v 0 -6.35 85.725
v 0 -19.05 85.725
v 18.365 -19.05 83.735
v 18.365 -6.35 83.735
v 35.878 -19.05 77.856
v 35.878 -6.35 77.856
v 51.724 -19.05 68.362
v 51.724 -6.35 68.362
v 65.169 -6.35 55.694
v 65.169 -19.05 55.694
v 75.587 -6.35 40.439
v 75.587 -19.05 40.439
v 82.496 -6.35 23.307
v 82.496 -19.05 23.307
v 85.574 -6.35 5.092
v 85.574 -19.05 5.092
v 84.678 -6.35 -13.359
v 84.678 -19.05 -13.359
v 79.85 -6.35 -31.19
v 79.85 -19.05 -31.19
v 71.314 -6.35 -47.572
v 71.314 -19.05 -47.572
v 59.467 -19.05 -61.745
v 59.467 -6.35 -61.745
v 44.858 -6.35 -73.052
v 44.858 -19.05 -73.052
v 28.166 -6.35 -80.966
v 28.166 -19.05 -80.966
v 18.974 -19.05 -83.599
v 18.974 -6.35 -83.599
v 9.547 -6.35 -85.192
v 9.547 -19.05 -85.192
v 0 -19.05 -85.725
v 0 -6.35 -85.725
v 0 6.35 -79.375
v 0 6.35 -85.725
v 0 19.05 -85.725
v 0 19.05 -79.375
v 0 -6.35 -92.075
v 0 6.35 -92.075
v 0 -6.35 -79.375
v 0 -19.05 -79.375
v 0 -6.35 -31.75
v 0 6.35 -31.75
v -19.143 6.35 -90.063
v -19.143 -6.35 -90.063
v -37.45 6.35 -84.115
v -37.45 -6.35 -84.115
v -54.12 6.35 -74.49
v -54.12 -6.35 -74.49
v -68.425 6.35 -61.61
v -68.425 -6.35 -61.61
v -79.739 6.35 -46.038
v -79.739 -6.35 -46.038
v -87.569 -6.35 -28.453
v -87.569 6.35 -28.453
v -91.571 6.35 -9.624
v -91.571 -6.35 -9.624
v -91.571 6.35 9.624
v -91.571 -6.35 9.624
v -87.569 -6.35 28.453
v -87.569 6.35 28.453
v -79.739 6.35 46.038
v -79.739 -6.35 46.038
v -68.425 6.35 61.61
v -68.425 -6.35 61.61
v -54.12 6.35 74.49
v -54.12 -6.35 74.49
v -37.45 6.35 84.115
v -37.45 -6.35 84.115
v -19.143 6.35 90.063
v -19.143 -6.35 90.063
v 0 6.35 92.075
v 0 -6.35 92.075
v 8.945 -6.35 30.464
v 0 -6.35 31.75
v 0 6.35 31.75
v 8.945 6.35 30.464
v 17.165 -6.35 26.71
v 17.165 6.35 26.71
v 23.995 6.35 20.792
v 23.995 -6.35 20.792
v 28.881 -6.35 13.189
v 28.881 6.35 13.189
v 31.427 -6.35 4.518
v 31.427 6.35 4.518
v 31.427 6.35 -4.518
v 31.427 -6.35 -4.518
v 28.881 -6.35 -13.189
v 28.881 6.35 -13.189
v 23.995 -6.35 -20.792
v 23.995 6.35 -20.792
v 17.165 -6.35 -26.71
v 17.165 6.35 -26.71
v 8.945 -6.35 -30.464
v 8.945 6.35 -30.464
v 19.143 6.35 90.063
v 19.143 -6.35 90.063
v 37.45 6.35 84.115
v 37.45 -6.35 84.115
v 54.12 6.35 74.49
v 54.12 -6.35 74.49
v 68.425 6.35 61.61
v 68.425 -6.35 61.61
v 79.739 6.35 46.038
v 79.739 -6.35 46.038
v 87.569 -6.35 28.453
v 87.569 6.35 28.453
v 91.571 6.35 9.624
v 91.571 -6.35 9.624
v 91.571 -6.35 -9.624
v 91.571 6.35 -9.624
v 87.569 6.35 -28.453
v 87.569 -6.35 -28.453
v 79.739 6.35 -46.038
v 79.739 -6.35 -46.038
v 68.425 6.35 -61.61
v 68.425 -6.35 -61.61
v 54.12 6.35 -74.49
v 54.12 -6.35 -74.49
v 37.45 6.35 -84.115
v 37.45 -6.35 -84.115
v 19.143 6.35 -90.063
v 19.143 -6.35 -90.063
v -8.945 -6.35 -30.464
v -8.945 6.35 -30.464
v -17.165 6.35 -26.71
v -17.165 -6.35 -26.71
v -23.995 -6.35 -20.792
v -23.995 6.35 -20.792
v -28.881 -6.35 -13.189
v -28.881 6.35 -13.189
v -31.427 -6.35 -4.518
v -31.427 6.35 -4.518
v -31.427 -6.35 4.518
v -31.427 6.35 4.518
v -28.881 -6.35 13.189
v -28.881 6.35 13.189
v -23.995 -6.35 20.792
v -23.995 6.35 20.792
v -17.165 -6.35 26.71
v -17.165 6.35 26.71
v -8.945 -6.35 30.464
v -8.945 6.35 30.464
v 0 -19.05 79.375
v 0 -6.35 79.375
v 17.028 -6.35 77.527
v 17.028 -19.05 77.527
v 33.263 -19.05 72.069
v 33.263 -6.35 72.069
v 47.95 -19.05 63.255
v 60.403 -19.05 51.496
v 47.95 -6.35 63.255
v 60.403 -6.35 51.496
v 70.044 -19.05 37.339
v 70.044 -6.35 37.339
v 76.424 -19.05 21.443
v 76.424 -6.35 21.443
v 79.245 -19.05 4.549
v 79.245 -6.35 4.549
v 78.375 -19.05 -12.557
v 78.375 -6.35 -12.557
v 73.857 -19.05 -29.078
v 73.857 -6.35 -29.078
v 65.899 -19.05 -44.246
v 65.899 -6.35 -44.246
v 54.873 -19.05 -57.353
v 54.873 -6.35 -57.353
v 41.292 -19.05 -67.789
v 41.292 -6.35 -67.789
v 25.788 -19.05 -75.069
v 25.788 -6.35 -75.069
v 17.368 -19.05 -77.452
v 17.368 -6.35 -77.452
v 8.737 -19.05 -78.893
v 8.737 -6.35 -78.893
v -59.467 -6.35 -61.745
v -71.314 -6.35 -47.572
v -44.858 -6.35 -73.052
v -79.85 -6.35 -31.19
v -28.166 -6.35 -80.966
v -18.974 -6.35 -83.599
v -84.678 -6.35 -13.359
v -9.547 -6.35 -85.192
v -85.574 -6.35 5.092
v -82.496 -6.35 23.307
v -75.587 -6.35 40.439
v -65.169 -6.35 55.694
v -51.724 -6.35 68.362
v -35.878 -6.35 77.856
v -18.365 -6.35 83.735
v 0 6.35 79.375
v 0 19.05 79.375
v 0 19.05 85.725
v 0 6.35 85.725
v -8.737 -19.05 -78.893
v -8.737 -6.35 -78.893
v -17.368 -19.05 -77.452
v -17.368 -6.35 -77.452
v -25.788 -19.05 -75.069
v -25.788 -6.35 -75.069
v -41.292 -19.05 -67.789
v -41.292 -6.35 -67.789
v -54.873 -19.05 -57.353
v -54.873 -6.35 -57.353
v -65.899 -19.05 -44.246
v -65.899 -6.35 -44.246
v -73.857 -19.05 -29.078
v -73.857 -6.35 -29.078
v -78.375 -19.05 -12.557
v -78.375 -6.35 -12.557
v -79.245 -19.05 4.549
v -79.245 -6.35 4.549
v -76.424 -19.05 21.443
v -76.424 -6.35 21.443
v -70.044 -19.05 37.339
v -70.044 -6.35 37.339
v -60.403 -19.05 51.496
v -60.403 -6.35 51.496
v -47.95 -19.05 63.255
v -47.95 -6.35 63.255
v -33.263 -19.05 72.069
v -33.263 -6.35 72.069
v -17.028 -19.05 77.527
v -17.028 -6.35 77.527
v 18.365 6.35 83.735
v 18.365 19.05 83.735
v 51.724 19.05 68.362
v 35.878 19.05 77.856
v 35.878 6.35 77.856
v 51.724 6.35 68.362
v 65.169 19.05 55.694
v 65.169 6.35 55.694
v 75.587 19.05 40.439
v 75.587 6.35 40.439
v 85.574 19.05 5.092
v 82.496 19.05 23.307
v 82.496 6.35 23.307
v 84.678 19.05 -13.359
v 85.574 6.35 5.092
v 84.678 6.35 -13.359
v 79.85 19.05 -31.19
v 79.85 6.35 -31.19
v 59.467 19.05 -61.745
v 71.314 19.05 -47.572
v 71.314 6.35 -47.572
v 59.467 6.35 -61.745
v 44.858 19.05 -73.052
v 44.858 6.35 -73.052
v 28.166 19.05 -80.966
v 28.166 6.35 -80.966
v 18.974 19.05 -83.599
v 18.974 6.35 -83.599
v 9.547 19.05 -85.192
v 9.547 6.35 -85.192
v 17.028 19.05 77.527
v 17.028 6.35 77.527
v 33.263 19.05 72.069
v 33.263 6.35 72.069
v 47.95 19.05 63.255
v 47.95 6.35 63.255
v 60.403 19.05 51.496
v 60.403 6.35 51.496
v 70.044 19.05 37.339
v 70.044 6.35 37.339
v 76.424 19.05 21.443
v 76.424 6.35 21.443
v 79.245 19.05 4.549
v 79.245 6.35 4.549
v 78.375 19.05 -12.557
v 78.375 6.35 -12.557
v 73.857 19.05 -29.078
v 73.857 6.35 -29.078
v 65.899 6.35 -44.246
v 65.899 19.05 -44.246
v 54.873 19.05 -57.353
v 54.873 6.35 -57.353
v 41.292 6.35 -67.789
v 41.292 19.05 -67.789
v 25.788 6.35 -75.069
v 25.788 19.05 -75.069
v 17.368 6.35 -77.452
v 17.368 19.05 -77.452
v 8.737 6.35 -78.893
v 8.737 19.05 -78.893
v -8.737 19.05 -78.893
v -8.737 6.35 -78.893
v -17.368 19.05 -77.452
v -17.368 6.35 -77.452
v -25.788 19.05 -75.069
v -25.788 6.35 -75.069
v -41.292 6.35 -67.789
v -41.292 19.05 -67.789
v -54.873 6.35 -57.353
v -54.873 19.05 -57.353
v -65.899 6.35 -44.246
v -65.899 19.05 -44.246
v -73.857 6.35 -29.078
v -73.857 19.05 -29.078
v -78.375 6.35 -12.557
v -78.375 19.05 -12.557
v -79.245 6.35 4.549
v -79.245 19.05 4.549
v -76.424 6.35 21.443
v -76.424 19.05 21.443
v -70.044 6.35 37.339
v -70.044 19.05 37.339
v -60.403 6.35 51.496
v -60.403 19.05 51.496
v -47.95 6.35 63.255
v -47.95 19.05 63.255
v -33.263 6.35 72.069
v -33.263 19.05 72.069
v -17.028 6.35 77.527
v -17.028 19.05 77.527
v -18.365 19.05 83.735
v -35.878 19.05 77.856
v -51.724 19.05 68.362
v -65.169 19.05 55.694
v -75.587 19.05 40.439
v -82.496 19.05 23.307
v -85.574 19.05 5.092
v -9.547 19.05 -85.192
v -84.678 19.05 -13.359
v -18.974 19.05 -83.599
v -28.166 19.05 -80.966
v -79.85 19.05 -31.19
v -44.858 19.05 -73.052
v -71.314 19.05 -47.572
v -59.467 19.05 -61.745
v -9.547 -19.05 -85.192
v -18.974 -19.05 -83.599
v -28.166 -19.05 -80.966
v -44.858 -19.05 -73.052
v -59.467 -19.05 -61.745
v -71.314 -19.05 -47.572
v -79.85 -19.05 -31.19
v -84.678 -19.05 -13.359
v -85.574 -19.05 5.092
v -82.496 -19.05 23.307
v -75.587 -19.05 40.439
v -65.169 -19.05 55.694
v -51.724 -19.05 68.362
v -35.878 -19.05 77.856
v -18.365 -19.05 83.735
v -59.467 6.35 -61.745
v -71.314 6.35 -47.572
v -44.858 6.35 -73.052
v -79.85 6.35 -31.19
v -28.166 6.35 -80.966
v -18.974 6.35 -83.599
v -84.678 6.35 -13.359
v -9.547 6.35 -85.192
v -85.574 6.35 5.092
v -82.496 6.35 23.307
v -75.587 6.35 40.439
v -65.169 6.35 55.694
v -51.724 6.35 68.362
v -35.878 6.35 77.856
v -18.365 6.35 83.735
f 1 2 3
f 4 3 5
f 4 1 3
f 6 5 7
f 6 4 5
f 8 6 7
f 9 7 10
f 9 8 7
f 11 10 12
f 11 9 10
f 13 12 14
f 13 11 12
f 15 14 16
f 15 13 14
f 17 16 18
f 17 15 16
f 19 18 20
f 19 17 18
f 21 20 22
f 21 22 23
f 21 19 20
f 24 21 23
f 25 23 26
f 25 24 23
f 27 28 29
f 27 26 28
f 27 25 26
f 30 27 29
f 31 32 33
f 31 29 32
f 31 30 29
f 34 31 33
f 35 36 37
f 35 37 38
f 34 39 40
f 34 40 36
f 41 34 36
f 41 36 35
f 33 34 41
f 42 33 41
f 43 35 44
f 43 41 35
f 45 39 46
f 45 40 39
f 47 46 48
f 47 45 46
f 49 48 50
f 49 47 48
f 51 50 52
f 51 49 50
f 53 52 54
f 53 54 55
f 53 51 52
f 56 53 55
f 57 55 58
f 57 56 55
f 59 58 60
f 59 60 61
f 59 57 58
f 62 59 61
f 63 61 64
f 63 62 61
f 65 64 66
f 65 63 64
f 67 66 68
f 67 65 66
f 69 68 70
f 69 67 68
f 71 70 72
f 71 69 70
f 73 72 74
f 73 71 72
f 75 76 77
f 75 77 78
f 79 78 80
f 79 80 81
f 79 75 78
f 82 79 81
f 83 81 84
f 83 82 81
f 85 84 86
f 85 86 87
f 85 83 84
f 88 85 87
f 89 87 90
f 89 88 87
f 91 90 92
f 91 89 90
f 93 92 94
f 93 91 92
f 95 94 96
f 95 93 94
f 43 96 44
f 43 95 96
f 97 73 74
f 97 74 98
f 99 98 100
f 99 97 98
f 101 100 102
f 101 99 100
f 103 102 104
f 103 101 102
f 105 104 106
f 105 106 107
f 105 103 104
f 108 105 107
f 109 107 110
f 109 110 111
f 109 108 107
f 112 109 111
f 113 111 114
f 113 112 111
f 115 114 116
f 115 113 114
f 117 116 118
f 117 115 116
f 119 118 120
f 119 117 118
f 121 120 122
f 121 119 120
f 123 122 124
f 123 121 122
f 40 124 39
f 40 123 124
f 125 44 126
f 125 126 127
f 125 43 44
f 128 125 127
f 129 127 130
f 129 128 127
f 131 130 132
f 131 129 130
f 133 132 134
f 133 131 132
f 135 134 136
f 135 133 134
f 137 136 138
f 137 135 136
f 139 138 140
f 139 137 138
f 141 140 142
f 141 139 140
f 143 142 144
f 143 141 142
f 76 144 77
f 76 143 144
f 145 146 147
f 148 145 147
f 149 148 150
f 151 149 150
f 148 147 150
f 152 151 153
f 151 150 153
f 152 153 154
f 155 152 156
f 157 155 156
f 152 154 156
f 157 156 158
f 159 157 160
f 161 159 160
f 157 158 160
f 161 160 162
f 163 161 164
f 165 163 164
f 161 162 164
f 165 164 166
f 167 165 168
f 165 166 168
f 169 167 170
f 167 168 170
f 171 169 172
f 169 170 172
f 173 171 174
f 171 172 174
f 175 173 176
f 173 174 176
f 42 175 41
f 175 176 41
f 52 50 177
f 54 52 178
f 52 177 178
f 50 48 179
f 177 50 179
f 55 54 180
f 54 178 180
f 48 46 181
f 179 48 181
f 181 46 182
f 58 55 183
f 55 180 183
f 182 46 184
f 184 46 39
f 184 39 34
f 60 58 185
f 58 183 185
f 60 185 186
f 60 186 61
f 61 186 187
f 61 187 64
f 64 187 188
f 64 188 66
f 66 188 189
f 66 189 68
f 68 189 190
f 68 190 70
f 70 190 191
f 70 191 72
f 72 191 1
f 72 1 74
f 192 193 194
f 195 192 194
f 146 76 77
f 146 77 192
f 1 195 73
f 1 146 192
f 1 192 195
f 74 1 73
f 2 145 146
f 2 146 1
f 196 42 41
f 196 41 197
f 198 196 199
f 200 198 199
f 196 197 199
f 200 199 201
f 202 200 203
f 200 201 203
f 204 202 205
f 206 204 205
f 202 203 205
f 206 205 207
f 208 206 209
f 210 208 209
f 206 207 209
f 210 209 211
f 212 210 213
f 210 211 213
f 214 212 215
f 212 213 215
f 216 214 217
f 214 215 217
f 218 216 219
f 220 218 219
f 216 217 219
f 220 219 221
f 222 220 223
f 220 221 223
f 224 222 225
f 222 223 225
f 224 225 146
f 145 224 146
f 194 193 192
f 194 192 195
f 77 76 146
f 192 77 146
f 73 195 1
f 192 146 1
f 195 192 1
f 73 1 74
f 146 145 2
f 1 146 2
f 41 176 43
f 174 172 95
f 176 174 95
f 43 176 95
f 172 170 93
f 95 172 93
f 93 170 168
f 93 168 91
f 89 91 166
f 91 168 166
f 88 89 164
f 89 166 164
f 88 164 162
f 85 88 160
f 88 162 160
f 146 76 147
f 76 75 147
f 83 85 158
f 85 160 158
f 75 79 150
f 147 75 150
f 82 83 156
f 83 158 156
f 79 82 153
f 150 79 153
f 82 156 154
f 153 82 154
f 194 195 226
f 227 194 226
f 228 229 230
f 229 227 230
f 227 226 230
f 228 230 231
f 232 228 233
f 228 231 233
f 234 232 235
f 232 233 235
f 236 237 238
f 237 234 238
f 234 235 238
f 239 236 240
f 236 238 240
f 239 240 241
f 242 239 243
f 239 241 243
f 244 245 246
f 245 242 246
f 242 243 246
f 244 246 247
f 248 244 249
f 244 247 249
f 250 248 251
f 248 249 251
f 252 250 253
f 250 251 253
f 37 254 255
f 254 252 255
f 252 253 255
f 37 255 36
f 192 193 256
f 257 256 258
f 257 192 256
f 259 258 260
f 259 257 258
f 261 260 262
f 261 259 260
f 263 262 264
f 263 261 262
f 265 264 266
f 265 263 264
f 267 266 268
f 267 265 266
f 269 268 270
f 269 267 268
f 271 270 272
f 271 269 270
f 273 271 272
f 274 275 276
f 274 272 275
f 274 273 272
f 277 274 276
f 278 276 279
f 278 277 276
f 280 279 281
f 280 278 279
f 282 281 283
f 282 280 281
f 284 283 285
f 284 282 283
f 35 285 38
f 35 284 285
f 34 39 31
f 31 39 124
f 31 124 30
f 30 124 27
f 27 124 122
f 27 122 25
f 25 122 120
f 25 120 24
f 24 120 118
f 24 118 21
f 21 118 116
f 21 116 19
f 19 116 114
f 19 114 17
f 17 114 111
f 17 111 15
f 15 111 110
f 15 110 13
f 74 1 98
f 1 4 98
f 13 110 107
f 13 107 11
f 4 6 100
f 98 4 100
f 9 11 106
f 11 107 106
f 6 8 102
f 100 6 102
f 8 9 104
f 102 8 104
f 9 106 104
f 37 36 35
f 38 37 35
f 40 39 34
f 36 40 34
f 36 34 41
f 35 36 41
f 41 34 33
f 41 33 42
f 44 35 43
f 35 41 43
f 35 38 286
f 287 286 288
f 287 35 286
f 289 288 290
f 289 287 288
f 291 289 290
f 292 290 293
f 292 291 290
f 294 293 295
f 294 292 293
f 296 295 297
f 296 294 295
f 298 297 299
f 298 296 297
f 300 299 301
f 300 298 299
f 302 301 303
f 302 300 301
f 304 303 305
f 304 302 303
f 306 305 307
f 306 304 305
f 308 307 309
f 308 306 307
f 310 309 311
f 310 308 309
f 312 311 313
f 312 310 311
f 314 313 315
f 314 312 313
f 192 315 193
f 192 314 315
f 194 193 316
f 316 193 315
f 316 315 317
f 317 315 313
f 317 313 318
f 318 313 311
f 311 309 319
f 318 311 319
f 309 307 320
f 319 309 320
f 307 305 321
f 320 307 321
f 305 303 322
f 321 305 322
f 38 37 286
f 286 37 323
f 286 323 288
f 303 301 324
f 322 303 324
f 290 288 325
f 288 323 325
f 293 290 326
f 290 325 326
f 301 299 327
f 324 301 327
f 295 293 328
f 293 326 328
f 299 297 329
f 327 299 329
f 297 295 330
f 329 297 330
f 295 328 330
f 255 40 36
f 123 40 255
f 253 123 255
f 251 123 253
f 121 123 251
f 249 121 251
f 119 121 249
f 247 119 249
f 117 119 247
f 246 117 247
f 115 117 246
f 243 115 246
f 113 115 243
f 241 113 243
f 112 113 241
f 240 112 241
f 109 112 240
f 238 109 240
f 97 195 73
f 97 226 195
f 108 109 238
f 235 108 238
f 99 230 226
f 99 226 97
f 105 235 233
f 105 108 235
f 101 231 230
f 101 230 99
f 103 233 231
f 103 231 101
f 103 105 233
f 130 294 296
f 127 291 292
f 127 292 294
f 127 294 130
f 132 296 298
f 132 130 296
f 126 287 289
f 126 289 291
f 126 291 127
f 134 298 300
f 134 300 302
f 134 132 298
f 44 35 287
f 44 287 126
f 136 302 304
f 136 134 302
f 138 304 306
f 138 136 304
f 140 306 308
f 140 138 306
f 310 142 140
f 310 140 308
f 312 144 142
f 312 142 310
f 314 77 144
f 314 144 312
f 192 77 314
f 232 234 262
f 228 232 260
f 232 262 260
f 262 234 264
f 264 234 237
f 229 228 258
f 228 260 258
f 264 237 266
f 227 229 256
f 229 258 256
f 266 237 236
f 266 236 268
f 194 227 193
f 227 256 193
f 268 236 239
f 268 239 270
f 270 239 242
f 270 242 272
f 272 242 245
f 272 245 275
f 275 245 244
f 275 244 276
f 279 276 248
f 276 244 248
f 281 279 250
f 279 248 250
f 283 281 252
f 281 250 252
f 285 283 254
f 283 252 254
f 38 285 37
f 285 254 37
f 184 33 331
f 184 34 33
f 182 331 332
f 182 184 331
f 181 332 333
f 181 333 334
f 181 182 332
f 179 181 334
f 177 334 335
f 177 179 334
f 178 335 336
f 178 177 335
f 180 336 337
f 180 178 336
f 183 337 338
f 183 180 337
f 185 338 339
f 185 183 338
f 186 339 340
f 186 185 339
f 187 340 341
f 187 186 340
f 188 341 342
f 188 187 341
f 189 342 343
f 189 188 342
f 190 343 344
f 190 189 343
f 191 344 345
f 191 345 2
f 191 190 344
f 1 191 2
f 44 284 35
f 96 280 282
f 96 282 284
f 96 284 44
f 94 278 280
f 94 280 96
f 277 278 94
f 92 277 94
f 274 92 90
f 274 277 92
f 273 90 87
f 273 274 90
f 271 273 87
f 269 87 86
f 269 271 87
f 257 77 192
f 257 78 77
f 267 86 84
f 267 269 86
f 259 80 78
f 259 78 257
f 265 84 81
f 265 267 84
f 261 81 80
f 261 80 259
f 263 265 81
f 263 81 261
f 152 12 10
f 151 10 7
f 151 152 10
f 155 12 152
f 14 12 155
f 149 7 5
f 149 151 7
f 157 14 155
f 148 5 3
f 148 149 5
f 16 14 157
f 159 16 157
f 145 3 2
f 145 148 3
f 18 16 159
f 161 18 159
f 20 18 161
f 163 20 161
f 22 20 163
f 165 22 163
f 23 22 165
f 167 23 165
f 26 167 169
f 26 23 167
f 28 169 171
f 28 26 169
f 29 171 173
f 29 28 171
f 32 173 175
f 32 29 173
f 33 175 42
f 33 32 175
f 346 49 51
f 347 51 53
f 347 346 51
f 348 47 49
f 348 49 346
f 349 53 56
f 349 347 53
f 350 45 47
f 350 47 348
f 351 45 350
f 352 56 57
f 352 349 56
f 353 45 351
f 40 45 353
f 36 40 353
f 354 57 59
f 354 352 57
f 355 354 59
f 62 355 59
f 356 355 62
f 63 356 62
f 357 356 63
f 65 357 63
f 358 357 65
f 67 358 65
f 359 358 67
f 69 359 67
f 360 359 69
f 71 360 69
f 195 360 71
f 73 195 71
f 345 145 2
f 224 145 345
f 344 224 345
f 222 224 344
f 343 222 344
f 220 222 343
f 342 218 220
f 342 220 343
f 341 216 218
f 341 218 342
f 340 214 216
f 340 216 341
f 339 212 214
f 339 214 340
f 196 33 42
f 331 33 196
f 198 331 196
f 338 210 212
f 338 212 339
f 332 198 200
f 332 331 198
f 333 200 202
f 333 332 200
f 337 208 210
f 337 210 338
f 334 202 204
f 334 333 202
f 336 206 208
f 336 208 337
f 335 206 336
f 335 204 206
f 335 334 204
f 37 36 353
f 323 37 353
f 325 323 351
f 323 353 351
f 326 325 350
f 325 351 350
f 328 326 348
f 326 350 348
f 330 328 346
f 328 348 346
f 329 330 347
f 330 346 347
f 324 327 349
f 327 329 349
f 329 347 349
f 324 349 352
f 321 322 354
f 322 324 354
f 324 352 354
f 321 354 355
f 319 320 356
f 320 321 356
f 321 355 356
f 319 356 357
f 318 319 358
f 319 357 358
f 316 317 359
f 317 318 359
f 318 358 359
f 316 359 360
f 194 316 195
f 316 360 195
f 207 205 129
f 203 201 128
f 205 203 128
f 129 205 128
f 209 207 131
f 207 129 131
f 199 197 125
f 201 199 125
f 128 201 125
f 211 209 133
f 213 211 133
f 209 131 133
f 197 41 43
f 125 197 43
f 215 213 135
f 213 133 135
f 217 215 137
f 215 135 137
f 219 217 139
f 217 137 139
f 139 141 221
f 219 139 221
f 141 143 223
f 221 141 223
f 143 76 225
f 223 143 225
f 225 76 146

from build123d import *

# Parameters (mm, degrees)
SKETCH1_R            = 92.075
SKETCH1_R_2          = 31.75
BOSS_EXTRUDE1_DEPTH  = 6.35
SKETCH5_R            = 85.725
SKETCH5_R_2          = 79.375
BOSS_EXTRUDE2_DEPTH  = 12.7
BOSS_EXTRUDE3_DEPTH  = 25.4
MIRROR5_COPY_1_DEPTH = 25.4
MIRROR5_COPY_2_DEPTH = 25.4


with BuildPart() as part:
    # Sketch1 → Boss-Extrude1 (new, symmetric)
    with BuildSketch(Plane(origin=(0, 0, 0), x_dir=(1, 0, 0), z_dir=(0, 1, 0))):
        with Locations(Location((0, 0, 0), (0, 0, 270))):
            Circle(SKETCH1_R)
        with Locations(Location((0, 0, 0), (0, 0, 270))):
            Circle(SKETCH1_R_2, mode=Mode.SUBTRACT)
    extrude(amount=BOSS_EXTRUDE1_DEPTH, both=True)

    # Sketch5 → Boss-Extrude2 (add)
    with BuildSketch(Plane(origin=(0, 6.35, 0), x_dir=(1, 0, 0), z_dir=(0, 1, 0))):
        with Locations(Location((0, 0, 0), (0, 0, 270))):
            Circle(SKETCH5_R)
        with Locations(Location((0, 0, 0), (0, 0, 270))):
            Circle(SKETCH5_R_2, mode=Mode.SUBTRACT)
    boss_extrude2 = extrude(amount=BOSS_EXTRUDE2_DEPTH)

    # Mirror1: Boss-Extrude2 across plane
    add(boss_extrude2.mirror(Plane.ZX))

    # Sketch7 → Boss-Extrude3 (add)
    with BuildSketch(Plane(origin=(0, 19.05, 0), x_dir=(1, 0, 0), z_dir=(0, 1, 0))):
        with BuildLine():
            Line((-25.787822327, 75.06916041), (-28.166257291, 80.965656764))
            ThreePointArc((-28.166257291, 80.965656764), (0, 85.725), (28.166257291, 80.965656764))
            Line((28.166257291, 80.965656764), (25.787822327, 75.06916041))
            ThreePointArc((25.787822327, 75.06916041), (0, 79.375), (-25.787822327, 75.06916041))
        make_face()
    boss_extrude3 = extrude(amount=-BOSS_EXTRUDE3_DEPTH)

    # Mirror3: Boss-Extrude3 across plane
    add(boss_extrude3.mirror(Plane.ZX))

    # Mirror4: Boss-Extrude3 across plane
    add(boss_extrude3.mirror(Plane.XY))

    # Mirror5 copy 1 sketch → Mirror5 copy 1 (add)
    with BuildSketch(Plane.XZ.offset(19.05)):
        with BuildLine():
            Line((-25.787822327, 75.06916041), (-28.166257291, 80.965656764))
            ThreePointArc((-28.166257291, 80.965656764), (0, 85.725), (28.166257291, 80.965656764))
            Line((28.166257291, 80.965656764), (25.787822327, 75.06916041))
            ThreePointArc((25.787822327, 75.06916041), (0, 79.375), (-25.787822327, 75.06916041))
        make_face()
    extrude(amount=-MIRROR5_COPY_1_DEPTH)

    # Mirror5 copy 2 sketch → Mirror5 copy 2 (add)
    with BuildSketch(Plane.XZ.offset(19.05)):
        with BuildLine():
            Line((-25.787822327, -75.06916041), (-28.166257291, -80.965656764))
            ThreePointArc((-28.166257291, -80.965656764), (0, -85.725), (28.166257291, -80.965656764))
            Line((28.166257291, -80.965656764), (25.787822327, -75.06916041))
            ThreePointArc((25.787822327, -75.06916041), (0, -79.375), (-25.787822327, -75.06916041))
        make_face()
    extrude(amount=-MIRROR5_COPY_2_DEPTH)


with BuildPart() as body_2:
    # Split1: the piece on the far side of the plane
    add(part.part)
    split(bisect_by=Plane(origin=(0, 0, 0), x_dir=(0, 0, 1), z_dir=(1, 0, 0)), keep=Keep.BOTTOM)


with BuildPart() as part_1:
    add(part.part)

    # Split1
    split(bisect_by=Plane(origin=(0, 0, 0), x_dir=(0, 0, 1), z_dir=(1, 0, 0)), keep=Keep.TOP)


solid = Compound([body_2.part, part_1.part])
